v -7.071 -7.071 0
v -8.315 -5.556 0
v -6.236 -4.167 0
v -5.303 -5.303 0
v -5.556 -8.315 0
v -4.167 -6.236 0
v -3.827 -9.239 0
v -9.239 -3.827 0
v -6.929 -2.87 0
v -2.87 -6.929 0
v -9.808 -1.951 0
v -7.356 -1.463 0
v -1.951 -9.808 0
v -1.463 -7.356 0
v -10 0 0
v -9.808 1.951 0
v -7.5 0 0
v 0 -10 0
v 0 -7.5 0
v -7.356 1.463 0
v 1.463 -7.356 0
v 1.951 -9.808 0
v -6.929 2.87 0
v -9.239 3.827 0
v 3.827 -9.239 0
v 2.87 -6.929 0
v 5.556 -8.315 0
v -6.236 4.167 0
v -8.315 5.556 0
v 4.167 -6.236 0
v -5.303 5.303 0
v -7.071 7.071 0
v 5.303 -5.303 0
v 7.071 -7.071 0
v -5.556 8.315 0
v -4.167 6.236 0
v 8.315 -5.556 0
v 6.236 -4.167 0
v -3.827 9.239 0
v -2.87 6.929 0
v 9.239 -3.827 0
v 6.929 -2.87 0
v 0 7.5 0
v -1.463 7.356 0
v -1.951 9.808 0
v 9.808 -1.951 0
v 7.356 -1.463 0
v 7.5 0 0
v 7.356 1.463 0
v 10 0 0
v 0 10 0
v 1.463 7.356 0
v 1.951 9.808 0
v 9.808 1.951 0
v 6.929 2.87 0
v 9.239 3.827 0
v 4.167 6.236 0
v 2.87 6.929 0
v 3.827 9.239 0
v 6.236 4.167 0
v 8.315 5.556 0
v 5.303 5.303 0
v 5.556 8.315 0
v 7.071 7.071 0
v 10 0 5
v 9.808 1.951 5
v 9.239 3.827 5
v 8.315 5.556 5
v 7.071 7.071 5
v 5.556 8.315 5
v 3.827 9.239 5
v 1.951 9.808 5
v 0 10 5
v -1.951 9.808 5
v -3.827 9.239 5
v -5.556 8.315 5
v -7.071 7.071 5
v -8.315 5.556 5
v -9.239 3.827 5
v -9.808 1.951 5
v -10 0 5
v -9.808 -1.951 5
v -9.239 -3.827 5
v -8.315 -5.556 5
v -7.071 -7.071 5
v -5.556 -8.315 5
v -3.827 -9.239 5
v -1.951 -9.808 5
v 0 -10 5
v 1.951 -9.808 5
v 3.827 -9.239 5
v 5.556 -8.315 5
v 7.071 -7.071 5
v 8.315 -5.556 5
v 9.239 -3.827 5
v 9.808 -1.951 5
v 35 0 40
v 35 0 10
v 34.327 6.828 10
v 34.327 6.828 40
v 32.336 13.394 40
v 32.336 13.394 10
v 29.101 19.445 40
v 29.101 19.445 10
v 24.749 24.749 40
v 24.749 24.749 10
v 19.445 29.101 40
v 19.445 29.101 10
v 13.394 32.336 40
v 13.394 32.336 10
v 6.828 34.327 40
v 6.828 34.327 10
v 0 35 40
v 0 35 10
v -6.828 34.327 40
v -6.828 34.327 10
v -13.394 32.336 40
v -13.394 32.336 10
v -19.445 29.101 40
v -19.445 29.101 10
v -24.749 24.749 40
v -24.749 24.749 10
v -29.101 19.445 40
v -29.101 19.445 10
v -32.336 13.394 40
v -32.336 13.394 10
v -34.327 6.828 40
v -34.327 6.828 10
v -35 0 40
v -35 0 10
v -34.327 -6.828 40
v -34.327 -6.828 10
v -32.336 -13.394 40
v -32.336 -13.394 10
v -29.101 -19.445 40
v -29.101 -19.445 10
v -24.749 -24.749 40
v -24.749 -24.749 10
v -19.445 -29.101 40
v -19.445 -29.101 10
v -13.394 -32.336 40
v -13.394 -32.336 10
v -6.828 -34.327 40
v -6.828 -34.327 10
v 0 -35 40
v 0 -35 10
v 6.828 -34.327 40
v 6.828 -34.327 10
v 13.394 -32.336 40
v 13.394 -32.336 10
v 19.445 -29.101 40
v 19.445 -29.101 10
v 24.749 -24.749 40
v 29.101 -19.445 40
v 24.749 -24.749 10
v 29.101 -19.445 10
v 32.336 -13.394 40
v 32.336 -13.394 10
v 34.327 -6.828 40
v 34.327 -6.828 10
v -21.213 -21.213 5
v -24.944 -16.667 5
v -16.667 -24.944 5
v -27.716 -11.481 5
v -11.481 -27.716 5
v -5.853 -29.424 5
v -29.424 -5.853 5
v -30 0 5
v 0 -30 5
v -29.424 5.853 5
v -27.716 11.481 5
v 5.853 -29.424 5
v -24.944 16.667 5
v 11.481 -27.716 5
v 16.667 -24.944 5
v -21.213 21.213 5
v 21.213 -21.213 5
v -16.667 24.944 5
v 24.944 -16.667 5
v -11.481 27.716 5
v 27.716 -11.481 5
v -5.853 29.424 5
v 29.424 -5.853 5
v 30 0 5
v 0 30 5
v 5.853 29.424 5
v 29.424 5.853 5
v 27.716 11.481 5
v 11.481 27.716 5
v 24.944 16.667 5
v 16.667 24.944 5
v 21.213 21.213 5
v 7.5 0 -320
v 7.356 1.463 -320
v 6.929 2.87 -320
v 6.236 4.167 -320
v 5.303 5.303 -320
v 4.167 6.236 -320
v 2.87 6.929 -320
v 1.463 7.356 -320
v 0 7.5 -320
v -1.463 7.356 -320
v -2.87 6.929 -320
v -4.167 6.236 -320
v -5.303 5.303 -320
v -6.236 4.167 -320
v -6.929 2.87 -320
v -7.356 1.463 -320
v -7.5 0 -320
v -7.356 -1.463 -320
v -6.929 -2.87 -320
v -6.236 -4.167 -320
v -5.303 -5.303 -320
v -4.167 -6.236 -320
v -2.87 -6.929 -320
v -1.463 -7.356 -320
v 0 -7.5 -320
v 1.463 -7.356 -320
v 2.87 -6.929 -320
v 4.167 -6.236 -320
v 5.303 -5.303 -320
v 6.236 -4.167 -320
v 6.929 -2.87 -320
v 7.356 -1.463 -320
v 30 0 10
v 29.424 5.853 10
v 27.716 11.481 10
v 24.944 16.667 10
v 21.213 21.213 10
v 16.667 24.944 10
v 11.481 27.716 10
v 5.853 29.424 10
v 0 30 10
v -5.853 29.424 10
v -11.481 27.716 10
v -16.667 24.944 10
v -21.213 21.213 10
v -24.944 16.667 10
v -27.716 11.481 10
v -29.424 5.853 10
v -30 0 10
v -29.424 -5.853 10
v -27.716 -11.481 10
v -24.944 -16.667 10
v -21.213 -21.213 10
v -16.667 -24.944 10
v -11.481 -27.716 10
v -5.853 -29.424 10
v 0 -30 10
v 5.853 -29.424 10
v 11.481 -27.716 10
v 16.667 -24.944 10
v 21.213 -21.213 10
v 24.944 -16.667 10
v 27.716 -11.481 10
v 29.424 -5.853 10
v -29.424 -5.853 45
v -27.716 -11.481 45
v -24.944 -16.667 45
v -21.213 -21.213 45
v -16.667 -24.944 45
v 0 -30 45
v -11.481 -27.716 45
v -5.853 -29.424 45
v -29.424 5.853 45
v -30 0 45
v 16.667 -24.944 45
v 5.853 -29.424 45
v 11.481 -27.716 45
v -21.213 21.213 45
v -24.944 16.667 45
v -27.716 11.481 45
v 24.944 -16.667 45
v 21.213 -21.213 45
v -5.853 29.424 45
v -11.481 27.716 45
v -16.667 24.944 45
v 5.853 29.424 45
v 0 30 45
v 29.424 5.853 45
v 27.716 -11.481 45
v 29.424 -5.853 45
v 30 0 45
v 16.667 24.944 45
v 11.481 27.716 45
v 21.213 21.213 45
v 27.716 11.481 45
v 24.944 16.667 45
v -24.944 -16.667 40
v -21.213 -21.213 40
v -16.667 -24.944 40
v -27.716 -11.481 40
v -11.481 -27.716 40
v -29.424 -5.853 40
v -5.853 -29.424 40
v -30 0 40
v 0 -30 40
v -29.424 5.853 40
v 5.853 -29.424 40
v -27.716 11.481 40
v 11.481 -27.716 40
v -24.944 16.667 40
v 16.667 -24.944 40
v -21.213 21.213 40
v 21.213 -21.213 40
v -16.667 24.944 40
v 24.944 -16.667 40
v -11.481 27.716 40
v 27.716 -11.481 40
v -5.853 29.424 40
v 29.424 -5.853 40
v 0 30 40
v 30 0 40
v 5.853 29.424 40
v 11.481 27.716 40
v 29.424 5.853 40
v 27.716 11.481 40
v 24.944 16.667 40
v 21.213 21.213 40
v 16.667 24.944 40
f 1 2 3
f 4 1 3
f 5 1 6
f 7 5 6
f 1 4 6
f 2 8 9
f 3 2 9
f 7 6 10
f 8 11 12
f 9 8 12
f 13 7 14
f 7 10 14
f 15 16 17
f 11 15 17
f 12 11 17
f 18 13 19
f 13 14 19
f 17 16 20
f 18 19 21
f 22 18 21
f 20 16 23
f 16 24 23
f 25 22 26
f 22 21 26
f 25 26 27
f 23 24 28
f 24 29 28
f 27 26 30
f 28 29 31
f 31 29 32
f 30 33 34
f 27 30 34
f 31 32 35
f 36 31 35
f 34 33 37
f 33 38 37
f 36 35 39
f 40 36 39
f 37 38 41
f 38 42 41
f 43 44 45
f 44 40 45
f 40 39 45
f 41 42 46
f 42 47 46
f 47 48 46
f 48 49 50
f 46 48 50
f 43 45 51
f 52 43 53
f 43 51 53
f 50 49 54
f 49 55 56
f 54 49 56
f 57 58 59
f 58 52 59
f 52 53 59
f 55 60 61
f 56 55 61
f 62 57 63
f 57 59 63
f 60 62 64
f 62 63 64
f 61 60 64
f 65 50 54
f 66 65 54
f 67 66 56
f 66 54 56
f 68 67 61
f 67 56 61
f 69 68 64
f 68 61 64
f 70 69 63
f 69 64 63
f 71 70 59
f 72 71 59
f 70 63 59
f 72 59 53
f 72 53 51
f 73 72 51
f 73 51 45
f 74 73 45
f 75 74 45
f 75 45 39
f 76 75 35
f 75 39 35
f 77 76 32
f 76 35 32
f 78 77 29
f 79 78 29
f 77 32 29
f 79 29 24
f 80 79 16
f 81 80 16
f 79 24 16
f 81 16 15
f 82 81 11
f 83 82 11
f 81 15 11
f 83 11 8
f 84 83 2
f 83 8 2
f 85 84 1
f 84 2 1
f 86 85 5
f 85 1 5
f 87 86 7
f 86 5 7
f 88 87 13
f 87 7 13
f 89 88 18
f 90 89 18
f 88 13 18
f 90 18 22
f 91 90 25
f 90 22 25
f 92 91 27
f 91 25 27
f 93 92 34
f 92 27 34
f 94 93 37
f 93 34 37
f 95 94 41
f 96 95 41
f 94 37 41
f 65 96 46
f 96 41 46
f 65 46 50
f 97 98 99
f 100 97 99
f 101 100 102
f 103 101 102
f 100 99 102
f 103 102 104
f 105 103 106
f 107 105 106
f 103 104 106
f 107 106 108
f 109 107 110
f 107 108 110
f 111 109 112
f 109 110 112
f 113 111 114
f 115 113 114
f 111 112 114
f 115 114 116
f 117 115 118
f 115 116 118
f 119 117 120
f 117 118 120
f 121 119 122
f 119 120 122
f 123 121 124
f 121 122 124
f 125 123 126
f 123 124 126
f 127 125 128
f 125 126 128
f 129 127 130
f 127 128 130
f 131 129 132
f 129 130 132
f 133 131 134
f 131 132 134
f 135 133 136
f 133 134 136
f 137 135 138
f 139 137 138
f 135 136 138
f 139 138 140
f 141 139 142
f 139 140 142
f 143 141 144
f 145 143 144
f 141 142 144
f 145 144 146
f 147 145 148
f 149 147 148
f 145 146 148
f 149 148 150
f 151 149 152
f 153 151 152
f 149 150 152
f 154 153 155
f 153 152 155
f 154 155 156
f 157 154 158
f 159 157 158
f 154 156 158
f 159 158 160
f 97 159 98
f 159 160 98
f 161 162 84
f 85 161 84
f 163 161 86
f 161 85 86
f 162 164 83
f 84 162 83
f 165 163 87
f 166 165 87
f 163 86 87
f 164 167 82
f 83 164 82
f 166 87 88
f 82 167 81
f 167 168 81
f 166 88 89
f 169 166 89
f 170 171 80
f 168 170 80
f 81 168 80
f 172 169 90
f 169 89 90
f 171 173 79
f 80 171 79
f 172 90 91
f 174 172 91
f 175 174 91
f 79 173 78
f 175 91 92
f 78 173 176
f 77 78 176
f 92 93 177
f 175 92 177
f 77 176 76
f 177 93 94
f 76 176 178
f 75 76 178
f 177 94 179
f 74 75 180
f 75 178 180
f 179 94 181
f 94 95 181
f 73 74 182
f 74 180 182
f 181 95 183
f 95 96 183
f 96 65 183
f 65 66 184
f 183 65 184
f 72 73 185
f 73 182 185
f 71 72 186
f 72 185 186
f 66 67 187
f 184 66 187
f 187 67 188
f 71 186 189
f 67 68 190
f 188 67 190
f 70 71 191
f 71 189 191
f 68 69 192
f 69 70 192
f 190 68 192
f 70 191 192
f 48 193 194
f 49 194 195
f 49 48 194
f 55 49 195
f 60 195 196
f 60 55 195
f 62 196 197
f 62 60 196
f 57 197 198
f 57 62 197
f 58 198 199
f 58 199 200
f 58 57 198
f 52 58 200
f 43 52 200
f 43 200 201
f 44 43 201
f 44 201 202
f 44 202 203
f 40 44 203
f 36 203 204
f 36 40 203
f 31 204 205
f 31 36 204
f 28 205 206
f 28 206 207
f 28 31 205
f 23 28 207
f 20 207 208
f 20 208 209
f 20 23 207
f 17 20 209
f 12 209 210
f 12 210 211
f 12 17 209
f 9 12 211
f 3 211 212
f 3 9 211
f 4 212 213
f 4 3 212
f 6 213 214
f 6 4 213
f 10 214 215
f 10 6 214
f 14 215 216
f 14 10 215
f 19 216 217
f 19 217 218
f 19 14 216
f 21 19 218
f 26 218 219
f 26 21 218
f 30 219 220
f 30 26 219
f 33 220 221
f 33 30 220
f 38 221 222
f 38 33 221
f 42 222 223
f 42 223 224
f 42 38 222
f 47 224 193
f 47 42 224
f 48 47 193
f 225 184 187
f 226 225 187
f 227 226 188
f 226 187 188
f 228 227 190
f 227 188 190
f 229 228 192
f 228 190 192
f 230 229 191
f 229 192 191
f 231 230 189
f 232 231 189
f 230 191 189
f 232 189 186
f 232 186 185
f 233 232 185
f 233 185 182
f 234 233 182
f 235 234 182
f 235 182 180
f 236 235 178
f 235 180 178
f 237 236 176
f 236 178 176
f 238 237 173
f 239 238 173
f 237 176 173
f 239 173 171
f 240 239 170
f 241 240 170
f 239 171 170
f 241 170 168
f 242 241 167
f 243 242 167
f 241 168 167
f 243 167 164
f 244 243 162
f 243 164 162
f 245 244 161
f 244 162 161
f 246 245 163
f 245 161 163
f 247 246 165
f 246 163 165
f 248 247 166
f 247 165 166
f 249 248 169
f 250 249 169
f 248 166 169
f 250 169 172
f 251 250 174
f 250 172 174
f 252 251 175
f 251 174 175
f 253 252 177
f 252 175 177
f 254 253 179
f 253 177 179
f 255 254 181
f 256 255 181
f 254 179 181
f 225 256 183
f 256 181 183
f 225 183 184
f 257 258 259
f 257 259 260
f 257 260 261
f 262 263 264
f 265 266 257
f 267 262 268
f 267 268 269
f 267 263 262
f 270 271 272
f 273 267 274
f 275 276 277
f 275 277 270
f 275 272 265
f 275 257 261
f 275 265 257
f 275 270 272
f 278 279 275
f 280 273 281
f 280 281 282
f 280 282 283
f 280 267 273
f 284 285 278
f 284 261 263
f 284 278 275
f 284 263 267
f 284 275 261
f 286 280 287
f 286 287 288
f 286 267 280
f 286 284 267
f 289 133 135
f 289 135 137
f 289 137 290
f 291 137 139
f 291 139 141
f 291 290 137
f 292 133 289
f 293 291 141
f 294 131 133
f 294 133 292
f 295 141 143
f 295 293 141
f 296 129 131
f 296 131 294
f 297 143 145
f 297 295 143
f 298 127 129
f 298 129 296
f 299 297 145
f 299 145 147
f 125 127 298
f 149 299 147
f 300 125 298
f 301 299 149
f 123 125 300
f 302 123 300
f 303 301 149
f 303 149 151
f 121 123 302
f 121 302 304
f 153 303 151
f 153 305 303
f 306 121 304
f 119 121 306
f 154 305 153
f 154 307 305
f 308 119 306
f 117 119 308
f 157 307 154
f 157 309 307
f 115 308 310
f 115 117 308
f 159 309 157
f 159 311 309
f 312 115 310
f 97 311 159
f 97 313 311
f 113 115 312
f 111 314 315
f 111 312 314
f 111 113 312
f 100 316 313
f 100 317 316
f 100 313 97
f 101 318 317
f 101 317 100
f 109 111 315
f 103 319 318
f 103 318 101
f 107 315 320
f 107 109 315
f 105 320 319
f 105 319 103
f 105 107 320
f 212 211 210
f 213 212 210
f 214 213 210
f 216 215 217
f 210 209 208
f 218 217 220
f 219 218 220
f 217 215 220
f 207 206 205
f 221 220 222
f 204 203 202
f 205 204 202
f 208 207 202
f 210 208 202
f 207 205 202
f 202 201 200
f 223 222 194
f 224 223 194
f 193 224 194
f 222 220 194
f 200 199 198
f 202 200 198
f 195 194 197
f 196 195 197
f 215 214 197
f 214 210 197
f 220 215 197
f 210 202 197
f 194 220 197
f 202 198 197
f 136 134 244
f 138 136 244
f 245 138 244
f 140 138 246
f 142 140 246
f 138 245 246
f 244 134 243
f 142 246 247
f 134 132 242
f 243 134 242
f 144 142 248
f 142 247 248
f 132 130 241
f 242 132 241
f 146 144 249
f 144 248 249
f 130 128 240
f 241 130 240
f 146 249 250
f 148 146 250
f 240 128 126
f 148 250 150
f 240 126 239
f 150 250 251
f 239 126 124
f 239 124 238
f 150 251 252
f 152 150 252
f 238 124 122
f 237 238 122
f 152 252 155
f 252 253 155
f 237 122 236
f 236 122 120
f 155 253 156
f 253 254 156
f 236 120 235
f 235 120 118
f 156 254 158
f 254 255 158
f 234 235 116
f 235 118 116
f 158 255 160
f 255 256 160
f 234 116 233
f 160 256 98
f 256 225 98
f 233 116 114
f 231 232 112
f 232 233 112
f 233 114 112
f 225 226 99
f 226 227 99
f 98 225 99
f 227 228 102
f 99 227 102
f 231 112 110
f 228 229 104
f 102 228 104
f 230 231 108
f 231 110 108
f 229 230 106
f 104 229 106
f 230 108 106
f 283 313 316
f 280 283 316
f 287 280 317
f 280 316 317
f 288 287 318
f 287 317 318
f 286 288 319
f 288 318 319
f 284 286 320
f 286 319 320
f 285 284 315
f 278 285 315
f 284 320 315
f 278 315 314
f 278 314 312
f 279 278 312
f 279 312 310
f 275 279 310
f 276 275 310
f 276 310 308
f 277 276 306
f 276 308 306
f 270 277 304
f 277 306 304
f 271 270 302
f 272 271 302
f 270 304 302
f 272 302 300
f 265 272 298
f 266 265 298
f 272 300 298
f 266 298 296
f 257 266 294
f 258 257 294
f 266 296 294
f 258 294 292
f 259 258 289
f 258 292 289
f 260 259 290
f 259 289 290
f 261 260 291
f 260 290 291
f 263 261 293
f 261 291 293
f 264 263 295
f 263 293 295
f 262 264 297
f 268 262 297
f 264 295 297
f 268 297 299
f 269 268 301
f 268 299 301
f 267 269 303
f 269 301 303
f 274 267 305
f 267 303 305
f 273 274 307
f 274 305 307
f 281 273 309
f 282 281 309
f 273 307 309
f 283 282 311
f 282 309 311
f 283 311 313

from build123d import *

# Parameters (mm, degrees)
SKETCH1_R           = 7.5
BOSS_EXTRUDE1_DEPTH = 320
SKETCH2_R           = 10
BOSS_EXTRUDE2_DEPTH = 5
SKETCH3_R           = 30
BOSS_EXTRUDE3_DEPTH = 5
SKETCH4_R           = 35
SKETCH4_R_2         = 30
BOSS_EXTRUDE4_DEPTH = 30
SKETCH5_R           = 30
BOSS_EXTRUDE5_DEPTH = 5


with BuildPart() as part:
    # Sketch1 → Boss-Extrude1 (new body)
    with BuildSketch(Plane.XY):
        Circle(SKETCH1_R)
    extrude(amount=-BOSS_EXTRUDE1_DEPTH)

    # Sketch2 → Boss-Extrude2 (add)
    with BuildSketch(Plane.XY):
        Circle(SKETCH2_R)
    extrude(amount=BOSS_EXTRUDE2_DEPTH)

    # Sketch3 → Boss-Extrude3 (add)
    with BuildSketch(Plane.XY.offset(5)):
        Circle(SKETCH3_R)
    extrude(amount=BOSS_EXTRUDE3_DEPTH)

    # Sketch4 → Boss-Extrude4 (add)
    # profile 1 of 2: a face of its own
    with BuildSketch(Plane.XY.offset(10)):
        Circle(SKETCH4_R)
        Circle(SKETCH4_R_2, mode=Mode.SUBTRACT)
    # profile 2 of 2: a face of its own
    with BuildSketch(Plane.XY.offset(10)):
        Circle(SKETCH4_R_2)
    extrude(amount=BOSS_EXTRUDE4_DEPTH)

    # Sketch5 → Boss-Extrude5 (add)
    with BuildSketch(Plane.XY.offset(40)):
        Circle(SKETCH5_R)
    extrude(amount=BOSS_EXTRUDE5_DEPTH)


solid = part.part
